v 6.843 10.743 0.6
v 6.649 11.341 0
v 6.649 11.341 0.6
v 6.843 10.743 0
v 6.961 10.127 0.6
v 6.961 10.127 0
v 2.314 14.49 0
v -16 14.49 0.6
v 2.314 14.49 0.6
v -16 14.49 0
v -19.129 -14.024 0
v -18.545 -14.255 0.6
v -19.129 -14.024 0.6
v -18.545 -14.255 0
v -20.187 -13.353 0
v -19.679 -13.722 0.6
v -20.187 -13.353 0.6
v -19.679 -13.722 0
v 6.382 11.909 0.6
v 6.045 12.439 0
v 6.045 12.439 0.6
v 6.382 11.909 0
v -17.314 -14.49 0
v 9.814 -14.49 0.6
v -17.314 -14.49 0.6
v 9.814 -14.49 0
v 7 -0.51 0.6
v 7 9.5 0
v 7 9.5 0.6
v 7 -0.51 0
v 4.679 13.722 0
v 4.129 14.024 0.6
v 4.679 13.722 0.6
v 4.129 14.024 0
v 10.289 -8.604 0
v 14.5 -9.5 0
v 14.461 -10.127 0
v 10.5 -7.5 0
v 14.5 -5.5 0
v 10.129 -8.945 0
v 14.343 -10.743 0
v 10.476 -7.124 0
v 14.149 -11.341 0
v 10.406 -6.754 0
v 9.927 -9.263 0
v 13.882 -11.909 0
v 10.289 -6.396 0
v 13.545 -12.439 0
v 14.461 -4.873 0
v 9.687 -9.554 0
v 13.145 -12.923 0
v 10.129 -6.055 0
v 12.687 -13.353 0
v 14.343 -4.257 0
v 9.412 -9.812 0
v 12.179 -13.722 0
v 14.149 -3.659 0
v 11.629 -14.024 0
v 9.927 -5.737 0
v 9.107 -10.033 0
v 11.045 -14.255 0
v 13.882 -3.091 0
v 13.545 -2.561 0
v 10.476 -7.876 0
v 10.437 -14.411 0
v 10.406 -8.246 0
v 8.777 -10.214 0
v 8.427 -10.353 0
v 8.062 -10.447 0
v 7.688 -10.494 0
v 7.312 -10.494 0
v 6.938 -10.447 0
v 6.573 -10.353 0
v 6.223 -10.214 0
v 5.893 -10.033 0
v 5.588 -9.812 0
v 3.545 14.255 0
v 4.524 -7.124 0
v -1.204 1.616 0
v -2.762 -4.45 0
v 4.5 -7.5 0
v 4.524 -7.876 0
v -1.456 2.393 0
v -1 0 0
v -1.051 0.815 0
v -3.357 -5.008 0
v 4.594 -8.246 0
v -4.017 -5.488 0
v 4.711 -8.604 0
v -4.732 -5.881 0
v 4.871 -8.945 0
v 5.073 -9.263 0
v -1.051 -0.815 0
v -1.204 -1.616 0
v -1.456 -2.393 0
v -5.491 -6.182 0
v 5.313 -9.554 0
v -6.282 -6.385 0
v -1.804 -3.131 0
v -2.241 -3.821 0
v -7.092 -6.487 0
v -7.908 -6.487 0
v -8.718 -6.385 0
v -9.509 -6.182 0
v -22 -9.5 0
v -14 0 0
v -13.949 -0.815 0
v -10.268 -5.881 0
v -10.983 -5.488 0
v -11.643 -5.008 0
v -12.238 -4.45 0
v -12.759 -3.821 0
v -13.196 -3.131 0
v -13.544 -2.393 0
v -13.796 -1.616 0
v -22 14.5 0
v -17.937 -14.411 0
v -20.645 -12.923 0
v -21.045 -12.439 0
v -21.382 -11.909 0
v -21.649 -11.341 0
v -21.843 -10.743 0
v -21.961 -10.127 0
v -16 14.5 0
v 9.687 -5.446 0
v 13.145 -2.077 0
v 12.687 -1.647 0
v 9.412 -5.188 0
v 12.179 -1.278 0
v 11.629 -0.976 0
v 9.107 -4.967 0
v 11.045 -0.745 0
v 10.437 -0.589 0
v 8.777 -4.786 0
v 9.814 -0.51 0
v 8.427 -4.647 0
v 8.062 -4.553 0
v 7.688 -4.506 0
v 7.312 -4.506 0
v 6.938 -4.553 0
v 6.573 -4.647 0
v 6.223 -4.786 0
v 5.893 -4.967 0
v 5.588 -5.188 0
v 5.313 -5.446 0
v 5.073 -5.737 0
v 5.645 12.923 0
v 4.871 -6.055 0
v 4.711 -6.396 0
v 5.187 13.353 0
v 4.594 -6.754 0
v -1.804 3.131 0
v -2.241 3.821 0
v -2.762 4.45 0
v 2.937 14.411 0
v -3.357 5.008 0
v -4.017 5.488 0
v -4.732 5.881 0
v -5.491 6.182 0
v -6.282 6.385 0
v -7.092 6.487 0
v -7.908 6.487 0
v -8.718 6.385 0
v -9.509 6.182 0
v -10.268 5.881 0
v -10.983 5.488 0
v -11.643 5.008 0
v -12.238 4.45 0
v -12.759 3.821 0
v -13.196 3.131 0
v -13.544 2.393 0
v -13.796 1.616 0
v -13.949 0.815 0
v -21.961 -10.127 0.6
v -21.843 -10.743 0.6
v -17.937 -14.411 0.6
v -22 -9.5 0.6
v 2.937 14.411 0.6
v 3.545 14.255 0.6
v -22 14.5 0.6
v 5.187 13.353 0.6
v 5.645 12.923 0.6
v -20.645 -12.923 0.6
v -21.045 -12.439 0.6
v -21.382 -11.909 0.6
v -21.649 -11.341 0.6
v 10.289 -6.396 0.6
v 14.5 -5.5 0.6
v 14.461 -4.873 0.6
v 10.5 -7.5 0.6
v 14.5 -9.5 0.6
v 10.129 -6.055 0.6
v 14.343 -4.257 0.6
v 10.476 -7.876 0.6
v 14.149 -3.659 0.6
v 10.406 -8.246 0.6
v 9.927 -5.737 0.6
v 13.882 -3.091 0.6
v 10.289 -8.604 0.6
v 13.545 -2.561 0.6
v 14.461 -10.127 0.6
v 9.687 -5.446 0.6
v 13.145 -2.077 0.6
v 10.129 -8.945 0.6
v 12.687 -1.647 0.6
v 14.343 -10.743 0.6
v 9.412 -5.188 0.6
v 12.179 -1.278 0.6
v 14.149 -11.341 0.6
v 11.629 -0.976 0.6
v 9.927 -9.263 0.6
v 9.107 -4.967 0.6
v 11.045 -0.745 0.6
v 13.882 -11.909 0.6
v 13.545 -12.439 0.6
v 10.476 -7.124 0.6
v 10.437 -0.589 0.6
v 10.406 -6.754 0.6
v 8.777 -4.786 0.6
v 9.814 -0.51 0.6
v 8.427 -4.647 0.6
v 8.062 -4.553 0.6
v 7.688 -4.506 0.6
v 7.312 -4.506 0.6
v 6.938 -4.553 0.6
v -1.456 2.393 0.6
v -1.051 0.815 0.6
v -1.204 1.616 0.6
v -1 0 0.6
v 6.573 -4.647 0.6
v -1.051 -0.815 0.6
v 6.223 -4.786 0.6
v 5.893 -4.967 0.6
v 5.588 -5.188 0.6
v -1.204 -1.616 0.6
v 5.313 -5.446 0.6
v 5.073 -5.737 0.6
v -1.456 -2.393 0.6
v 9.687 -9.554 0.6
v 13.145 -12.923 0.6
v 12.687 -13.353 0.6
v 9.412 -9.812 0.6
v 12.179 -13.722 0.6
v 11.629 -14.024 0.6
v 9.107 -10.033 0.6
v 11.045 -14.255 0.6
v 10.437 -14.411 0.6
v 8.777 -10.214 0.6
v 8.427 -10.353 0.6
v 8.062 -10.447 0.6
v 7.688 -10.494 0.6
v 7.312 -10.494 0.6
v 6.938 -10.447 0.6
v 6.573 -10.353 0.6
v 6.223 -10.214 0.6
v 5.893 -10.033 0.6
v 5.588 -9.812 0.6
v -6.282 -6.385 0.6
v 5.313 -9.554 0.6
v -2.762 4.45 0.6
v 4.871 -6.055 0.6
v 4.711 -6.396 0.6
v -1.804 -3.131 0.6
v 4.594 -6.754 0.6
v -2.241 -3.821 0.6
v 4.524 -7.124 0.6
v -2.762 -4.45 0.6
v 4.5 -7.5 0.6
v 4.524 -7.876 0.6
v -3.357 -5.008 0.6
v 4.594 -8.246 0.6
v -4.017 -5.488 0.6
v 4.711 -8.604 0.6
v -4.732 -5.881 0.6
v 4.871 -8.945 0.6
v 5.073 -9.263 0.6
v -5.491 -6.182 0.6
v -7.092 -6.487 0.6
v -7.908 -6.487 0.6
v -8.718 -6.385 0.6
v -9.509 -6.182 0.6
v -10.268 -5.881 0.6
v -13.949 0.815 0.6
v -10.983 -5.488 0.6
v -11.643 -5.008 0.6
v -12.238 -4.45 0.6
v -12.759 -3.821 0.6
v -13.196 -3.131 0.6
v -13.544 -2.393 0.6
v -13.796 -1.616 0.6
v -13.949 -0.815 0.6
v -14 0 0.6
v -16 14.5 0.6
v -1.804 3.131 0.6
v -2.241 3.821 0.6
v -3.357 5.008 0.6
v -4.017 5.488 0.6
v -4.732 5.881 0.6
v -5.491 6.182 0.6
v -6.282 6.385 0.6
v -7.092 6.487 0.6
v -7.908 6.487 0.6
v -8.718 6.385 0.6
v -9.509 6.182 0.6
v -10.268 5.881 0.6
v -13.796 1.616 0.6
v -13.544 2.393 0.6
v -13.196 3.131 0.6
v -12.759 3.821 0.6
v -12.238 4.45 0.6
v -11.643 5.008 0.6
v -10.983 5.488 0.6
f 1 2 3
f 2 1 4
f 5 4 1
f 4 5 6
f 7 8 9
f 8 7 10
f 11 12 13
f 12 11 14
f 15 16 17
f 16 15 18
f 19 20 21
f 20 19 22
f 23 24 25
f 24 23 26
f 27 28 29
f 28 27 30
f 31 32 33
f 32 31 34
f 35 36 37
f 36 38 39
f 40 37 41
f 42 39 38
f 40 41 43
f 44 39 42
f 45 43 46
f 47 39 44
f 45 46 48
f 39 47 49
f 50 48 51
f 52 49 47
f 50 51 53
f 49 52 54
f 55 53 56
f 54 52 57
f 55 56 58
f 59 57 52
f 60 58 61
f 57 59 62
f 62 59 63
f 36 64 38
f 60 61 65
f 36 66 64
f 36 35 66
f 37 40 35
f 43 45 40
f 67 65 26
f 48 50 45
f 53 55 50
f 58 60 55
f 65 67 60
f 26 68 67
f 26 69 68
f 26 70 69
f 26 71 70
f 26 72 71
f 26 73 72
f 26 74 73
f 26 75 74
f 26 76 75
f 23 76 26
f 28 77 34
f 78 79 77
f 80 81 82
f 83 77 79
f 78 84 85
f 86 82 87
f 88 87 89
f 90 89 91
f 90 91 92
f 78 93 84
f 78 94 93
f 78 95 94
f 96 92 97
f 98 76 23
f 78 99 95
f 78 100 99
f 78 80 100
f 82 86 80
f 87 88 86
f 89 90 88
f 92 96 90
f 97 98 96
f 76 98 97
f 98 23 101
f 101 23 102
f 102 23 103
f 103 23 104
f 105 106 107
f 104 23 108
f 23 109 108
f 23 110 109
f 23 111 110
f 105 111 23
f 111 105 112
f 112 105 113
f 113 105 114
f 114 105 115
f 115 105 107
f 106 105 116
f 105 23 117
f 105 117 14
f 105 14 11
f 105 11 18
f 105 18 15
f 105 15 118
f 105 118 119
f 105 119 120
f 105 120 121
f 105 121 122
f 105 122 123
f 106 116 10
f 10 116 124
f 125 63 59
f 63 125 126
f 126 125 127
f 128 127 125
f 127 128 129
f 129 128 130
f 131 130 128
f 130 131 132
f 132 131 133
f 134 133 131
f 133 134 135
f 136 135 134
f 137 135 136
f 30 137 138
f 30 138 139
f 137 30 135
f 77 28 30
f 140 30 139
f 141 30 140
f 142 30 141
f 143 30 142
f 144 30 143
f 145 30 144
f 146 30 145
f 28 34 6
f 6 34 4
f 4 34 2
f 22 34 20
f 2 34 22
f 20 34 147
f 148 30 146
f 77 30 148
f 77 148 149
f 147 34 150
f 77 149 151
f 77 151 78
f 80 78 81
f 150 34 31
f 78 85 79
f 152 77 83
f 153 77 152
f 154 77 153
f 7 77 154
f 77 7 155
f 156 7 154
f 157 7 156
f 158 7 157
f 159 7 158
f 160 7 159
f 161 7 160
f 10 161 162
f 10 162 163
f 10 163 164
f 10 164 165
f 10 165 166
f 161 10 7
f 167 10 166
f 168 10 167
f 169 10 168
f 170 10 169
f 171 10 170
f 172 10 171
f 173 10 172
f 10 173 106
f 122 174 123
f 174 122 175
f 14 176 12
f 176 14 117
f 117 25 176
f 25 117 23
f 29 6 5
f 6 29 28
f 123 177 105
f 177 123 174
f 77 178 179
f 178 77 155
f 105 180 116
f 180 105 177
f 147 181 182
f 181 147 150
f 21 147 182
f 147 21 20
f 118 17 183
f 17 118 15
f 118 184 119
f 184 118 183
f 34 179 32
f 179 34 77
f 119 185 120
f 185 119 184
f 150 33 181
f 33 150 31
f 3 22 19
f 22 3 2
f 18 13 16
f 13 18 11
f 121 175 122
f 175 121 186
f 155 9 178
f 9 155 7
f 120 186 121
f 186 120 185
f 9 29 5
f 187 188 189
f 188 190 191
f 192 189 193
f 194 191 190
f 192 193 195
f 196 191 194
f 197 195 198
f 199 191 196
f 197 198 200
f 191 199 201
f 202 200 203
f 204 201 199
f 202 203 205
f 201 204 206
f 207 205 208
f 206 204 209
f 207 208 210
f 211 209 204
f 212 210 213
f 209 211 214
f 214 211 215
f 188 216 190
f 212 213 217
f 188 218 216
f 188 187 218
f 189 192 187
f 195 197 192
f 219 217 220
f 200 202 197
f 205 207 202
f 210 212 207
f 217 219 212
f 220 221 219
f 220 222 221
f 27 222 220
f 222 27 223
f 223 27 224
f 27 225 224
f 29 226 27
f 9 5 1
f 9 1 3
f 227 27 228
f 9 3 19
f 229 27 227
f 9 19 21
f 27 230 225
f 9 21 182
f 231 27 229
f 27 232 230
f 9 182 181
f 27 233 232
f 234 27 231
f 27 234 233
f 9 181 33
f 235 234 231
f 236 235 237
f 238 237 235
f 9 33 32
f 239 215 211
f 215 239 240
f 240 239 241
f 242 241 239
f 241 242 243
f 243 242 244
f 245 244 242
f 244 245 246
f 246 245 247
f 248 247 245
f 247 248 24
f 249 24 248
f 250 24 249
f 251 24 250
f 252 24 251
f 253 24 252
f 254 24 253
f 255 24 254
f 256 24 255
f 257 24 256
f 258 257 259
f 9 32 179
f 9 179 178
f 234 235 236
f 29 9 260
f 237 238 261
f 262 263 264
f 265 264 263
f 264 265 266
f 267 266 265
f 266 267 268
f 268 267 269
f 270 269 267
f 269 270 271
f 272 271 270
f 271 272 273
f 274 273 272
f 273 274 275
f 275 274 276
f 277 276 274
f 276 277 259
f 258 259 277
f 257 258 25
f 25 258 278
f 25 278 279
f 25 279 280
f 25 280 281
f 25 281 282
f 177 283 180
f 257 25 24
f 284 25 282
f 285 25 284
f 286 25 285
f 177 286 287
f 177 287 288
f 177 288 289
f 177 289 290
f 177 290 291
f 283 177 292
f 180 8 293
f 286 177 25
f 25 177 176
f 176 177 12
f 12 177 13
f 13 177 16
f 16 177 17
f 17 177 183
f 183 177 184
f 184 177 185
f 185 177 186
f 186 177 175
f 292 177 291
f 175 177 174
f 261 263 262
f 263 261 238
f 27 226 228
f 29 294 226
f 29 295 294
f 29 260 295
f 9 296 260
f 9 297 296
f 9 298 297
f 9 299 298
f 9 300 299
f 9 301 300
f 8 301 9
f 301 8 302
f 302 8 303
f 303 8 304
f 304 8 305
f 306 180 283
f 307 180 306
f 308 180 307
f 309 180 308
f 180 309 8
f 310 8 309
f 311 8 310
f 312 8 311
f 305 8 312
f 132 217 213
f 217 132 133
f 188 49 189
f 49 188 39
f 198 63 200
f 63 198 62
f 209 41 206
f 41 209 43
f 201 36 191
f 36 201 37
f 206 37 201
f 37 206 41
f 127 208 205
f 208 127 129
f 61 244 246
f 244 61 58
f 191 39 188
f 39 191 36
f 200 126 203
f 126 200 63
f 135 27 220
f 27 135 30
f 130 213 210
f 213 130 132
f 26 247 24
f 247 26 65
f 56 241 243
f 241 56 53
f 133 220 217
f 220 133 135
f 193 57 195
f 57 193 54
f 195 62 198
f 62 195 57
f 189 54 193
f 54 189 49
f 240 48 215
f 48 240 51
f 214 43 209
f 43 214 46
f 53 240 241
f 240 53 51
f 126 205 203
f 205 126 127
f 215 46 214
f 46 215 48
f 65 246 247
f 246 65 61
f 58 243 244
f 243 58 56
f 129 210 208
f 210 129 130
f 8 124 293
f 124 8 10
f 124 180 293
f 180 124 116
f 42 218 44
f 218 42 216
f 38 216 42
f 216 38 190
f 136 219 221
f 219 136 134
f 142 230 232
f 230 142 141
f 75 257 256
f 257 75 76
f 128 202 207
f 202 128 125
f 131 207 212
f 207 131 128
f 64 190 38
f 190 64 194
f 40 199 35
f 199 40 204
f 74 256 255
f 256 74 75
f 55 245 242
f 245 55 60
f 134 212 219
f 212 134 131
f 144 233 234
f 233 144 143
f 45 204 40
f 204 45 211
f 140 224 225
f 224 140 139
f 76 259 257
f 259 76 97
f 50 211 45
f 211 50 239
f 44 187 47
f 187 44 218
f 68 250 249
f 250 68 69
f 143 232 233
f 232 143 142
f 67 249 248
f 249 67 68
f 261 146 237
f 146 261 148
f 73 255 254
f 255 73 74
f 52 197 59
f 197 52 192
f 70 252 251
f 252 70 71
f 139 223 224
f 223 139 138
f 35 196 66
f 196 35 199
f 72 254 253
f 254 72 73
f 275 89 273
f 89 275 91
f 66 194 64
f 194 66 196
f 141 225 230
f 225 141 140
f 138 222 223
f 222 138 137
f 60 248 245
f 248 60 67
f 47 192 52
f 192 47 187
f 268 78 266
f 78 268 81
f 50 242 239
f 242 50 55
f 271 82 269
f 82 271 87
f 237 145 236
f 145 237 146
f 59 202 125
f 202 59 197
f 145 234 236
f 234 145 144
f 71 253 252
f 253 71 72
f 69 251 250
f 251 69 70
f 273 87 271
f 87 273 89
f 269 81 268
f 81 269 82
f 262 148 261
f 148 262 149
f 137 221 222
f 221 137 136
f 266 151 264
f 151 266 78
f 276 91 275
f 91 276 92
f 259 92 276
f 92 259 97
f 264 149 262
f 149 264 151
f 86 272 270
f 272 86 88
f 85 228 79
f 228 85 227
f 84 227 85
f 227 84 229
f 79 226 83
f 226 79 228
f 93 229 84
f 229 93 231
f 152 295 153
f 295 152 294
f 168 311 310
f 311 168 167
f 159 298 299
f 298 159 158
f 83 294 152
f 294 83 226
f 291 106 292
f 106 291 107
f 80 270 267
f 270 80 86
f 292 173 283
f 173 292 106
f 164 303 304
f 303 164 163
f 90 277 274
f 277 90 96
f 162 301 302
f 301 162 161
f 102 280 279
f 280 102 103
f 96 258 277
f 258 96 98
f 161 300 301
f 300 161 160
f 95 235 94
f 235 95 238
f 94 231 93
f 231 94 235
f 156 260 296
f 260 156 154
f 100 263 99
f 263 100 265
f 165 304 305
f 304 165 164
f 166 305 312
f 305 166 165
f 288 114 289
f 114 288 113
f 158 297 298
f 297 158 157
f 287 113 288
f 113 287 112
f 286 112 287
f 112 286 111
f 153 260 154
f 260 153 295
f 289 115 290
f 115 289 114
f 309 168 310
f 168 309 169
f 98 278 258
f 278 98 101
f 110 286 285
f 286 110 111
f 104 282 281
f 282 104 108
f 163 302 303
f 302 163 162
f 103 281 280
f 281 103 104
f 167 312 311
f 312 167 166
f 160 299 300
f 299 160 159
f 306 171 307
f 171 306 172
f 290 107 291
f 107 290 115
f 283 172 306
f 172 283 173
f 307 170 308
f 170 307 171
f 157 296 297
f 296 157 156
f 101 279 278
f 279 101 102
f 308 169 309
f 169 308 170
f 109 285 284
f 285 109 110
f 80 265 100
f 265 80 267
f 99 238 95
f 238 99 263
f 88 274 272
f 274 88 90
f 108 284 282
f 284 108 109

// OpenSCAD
$fn = 50;


difference() {
	union() {
		translate(v = [-7.5000000000, 0, 0]) {
			rotate(a = [0, 0, 0]) {
				hull() {
					translate(v = [-9.5000000000, 9.5000000000, 0]) {
						rotate(a = [0, 0, 0]) {
							translate(v = [0, 0, 0]) {
								rotate(a = [0, 0, 0]) {
									cylinder(h = 0.6000000000, r = 5);
								}
							}
						}
					}
					translate(v = [9.5000000000, 9.5000000000, 0]) {
						rotate(a = [0, 0, 0]) {
							translate(v = [0, 0, 0]) {
								rotate(a = [0, 0, 0]) {
									cylinder(h = 0.6000000000, r = 5);
								}
							}
						}
					}
					translate(v = [-9.5000000000, -9.5000000000, 0]) {
						rotate(a = [0, 0, 0]) {
							translate(v = [0, 0, 0]) {
								rotate(a = [0, 0, 0]) {
									cylinder(h = 0.6000000000, r = 5);
								}
							}
						}
					}
					translate(v = [9.5000000000, -9.5000000000, 0]) {
						rotate(a = [0, 0, 0]) {
							translate(v = [0, 0, 0]) {
								rotate(a = [0, 0, 0]) {
									cylinder(h = 0.6000000000, r = 5);
								}
							}
						}
					}
				}
			}
		}
		translate(v = [0.0000000000, -7.5000000000, 0]) {
			rotate(a = [0, 0, 0]) {
				hull() {
					translate(v = [-9.5000000000, 2.0000000000, 0]) {
						rotate(a = [0, 0, 0]) {
							translate(v = [0, 0, 0]) {
								rotate(a = [0, 0, 0]) {
									cylinder(h = 0.6000000000, r = 5);
								}
							}
						}
					}
					translate(v = [9.5000000000, 2.0000000000, 0]) {
						rotate(a = [0, 0, 0]) {
							translate(v = [0, 0, 0]) {
								rotate(a = [0, 0, 0]) {
									cylinder(h = 0.6000000000, r = 5);
								}
							}
						}
					}
					translate(v = [-9.5000000000, -2.0000000000, 0]) {
						rotate(a = [0, 0, 0]) {
							translate(v = [0, 0, 0]) {
								rotate(a = [0, 0, 0]) {
									cylinder(h = 0.6000000000, r = 5);
								}
							}
						}
					}
					translate(v = [9.5000000000, -2.0000000000, 0]) {
						rotate(a = [0, 0, 0]) {
							translate(v = [0, 0, 0]) {
								rotate(a = [0, 0, 0]) {
									cylinder(h = 0.6000000000, r = 5);
								}
							}
						}
					}
				}
			}
		}
		translate(v = [-22.0000000000, 8.5000000000, 0]) {
			rotate(a = [0, 0, 0]) {
				cube(size = [6, 6, 0.6000000000]);
			}
		}
	}
	union() {
		translate(v = [7.5000000000, -7.5000000000, -125.0000000000]) {
			rotate(a = [0, 0, 0]) {
				cylinder(h = 250, r = 3.0000000000);
			}
		}
		translate(v = [-7.5000000000, 0, 0.0000000000]) {
			rotate(a = [0, 0, 0]) {
				cylinder(h = 0.6000000000, r = 6.5000000000);
			}
		}
	}
}
